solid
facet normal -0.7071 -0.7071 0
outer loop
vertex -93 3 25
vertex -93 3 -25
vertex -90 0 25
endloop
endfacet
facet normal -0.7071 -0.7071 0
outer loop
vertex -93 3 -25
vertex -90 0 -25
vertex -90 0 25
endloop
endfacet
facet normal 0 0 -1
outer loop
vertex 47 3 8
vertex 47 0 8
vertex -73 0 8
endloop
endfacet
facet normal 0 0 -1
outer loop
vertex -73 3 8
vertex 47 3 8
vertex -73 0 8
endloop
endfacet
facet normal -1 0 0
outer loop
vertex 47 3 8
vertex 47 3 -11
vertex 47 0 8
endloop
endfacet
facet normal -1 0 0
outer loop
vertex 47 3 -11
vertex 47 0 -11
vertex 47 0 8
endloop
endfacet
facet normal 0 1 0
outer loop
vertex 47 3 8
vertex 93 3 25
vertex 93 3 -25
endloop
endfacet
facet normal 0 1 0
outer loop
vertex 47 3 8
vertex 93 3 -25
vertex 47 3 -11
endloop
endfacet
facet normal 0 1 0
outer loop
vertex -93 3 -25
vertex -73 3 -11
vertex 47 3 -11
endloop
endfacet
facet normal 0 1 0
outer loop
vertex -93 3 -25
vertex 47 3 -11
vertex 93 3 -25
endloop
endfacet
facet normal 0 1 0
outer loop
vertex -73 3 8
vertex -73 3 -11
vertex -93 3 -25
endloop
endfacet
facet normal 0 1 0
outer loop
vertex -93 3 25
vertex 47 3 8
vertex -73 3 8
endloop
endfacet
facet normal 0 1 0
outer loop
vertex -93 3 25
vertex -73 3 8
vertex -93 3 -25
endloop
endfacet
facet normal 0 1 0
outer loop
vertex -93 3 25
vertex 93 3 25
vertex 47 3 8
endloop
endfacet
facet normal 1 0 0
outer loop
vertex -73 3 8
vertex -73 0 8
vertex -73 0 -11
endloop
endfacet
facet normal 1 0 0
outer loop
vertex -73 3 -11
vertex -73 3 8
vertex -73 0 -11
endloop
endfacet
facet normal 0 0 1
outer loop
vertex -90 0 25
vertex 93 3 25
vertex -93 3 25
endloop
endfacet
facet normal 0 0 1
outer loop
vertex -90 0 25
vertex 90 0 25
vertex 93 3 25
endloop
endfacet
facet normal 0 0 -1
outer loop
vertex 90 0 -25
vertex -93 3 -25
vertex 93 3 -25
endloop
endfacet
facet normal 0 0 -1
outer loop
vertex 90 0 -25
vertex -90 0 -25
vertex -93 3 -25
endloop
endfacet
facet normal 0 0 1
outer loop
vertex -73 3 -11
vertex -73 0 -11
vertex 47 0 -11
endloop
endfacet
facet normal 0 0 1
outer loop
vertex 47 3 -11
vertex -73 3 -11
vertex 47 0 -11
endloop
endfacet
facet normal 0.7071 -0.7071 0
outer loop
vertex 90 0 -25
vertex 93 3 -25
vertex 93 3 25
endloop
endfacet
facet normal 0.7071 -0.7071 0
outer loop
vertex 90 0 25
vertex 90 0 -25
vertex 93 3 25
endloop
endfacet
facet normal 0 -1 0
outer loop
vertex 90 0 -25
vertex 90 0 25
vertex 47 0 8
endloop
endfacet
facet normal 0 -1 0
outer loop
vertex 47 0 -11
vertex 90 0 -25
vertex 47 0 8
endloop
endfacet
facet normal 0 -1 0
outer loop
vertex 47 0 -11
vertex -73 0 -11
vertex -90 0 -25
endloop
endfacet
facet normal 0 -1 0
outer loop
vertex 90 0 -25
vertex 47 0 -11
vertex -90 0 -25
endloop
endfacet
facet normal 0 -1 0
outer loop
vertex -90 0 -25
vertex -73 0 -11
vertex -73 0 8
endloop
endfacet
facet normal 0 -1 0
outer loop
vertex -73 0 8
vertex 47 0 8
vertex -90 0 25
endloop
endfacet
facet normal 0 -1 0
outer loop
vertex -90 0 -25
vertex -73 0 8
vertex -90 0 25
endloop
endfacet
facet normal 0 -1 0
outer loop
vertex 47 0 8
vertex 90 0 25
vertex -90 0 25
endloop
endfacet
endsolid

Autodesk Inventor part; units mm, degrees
ref_plane "YZ Plane" through (0, 0, 0) normal (1, 0, 0) x (0, 1, 0)
ref_plane "XZ Plane" through (0, 0, 0) normal (0, 1, 0) x (-1, 0, 0)
ref_plane "XY Plane" through (0, 0, 0) normal (0, 0, 1) x (1, 0, 0)
sketch "Sketch1" plane through (0, 0, 0) normal (0, 1, 0) x (-1, 0, 0)
  line L0 (93, -25) -> (-93, -25)
  line L1 (-93, -25) -> (-93, 25)
  line L2 (-93, 25) -> (93, 25)
  line L3 (93, 25) -> (93, -25)
  line L4 (93, -25) -> (-93, 25) construction
  line L5 (-93, -25) -> (93, 25) construction
  line L6 (73, -11) -> (-47, -11)
  line L7 (-47, -11) -> (-47, 8)
  line L8 (-47, 8) -> (73, 8)
  line L9 (73, 8) -> (73, -11)
  point P0 (0, 0)
  dimension "d0" = 186
  dimension "d1" = 50
  dimension "d2" = 17
  dimension "d3" = 36
  dimension "d4" = 120
  dimension "d5" = 20
extrude "Extrusion1" add sketch "Sketch1" along normal blind 3
chamfer "Chamfer3" distance 3 angle 45 1 edges at (-93, 0, 0) measured on face at (-93, 1, -8.3333)
chamfer "Chamfer4" distance 3 angle 45 1 edges at (93, 0, 0) measured on face at (93, 1, 8.3333)
properties part number "Front Wall"
